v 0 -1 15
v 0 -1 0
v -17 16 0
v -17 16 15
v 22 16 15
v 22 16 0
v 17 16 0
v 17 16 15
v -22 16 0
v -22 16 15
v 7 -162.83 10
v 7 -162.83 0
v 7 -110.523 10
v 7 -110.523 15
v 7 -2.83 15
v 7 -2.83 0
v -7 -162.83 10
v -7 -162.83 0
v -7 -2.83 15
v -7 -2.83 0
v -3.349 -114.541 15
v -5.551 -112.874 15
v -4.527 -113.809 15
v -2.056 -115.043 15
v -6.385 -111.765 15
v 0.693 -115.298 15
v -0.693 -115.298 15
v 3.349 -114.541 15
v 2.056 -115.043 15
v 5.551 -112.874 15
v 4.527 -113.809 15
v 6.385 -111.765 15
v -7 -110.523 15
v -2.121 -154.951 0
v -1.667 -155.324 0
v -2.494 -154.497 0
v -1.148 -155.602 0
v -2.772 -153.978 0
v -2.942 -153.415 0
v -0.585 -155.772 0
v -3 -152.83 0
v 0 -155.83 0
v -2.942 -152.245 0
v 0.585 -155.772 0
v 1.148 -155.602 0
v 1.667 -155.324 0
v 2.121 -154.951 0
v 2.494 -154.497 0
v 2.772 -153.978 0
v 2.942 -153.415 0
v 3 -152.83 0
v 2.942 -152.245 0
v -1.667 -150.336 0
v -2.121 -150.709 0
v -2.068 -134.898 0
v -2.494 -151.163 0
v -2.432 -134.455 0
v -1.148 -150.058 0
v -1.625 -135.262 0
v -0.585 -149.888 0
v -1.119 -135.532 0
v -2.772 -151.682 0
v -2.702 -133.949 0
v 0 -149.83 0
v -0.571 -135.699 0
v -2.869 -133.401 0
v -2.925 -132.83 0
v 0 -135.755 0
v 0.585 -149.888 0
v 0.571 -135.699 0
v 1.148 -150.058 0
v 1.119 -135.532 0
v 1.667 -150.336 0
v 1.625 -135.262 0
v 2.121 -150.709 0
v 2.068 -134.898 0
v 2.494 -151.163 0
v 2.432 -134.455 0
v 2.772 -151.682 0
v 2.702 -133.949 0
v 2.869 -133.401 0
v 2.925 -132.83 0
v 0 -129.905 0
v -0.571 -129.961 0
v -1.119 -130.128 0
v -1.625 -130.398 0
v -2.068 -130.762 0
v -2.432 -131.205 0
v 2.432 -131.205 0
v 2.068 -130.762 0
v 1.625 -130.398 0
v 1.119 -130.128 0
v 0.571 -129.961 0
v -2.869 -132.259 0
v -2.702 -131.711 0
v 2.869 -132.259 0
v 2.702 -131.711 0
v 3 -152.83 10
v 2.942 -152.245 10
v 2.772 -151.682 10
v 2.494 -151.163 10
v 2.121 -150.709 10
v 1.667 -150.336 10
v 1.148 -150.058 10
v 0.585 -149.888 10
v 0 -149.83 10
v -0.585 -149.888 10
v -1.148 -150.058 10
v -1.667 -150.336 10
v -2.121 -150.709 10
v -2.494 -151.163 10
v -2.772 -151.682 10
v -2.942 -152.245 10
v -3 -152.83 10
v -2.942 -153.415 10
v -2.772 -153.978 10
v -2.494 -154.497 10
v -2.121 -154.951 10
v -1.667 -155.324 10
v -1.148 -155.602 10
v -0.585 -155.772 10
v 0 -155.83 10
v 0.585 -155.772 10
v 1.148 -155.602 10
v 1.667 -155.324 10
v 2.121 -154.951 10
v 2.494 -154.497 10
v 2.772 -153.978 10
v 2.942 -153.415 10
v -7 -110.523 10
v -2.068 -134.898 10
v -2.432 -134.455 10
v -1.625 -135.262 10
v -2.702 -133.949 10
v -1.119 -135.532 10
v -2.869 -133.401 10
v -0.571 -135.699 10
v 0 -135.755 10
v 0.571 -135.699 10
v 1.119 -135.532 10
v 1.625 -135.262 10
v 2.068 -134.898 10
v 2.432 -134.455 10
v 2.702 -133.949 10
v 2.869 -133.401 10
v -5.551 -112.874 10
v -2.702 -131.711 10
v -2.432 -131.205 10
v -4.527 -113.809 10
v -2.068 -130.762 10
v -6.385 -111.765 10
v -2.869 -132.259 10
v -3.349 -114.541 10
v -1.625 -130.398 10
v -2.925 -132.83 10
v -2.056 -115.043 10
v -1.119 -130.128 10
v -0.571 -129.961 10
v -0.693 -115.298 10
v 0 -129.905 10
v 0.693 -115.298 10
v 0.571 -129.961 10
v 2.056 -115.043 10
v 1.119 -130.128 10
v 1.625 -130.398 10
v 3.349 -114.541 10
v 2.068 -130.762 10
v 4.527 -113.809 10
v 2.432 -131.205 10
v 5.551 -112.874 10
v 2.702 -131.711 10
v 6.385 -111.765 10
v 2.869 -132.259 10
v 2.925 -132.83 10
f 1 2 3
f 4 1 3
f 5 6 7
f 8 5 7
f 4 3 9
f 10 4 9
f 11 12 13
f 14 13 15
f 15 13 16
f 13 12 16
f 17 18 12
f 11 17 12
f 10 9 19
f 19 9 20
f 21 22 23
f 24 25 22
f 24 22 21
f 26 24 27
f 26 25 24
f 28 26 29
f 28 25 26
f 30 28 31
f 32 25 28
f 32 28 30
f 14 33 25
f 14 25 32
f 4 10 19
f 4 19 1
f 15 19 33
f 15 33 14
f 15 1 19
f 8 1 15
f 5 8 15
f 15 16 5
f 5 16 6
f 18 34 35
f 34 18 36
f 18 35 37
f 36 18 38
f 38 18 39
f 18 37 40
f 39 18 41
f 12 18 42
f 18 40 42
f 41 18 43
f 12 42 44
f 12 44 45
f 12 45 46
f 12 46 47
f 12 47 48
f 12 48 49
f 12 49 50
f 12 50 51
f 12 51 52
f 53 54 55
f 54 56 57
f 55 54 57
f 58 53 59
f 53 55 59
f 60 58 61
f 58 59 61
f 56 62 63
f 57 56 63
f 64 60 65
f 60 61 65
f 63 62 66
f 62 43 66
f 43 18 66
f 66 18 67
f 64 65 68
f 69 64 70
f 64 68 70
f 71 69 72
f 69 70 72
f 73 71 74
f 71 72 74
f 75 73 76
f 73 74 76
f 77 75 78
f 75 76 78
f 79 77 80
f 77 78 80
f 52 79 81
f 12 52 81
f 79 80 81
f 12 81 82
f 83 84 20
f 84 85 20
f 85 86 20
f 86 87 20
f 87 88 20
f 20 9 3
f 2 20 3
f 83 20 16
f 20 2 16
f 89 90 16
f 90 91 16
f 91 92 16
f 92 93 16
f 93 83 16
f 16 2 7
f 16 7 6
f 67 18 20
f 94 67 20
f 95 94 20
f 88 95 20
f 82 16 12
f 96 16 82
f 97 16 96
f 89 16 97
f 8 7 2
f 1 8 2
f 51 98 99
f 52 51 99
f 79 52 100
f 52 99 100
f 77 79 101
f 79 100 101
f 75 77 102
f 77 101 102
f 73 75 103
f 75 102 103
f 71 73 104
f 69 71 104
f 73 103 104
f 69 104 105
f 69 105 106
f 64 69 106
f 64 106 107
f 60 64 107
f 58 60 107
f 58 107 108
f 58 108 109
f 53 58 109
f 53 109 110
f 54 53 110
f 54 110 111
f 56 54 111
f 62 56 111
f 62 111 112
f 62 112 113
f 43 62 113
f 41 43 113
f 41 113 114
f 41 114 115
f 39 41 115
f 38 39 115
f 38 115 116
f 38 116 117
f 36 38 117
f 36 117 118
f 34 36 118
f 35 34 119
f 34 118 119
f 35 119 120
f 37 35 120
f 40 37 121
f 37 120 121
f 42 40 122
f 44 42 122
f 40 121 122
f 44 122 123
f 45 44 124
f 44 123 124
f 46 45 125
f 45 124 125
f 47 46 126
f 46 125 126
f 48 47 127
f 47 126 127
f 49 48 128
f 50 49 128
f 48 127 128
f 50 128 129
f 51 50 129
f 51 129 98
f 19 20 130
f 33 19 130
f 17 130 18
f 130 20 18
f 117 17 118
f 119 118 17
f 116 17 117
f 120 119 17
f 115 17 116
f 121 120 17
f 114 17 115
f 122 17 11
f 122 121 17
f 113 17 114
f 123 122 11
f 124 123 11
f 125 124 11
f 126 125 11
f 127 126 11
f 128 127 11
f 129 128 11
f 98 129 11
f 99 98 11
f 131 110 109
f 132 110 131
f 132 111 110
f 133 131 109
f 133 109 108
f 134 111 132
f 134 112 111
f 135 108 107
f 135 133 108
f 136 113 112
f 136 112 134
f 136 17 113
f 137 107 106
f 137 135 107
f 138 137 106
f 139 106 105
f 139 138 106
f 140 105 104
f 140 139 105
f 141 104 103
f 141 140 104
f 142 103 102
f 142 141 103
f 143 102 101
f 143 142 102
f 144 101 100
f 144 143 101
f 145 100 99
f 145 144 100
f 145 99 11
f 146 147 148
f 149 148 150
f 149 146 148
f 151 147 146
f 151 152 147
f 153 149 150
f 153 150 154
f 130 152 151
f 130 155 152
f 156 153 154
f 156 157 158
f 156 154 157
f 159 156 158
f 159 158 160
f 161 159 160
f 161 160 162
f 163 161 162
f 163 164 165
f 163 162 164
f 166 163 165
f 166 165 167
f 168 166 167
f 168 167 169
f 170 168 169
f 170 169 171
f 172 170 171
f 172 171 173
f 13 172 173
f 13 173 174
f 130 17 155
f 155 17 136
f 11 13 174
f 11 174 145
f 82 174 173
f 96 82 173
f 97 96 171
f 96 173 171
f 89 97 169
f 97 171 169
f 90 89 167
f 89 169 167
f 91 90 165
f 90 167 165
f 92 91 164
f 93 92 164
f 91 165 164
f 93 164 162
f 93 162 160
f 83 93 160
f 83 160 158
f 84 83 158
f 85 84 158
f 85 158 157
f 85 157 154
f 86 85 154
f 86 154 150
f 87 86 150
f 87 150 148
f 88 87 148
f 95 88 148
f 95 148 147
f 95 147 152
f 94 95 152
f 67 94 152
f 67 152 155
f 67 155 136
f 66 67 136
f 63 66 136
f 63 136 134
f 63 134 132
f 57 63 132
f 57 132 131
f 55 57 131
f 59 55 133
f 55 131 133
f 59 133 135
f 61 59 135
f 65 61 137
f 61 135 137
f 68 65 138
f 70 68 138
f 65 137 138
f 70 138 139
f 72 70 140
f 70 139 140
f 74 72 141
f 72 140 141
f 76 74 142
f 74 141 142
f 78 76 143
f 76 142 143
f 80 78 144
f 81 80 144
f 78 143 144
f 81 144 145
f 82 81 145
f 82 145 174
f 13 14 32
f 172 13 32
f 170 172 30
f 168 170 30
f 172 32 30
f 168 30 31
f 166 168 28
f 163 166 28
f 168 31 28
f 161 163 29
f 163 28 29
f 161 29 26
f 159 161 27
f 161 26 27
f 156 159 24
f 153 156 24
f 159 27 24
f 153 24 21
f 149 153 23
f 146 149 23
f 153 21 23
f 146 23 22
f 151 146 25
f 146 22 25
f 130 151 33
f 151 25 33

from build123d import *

# Parameters (mm, degrees)
BOSS_EXTRUDE1_DEPTH = 15
SKETCH2_R           = 2.925
SKETCH2_R_2         = 3
CUT_EXTRUDE1_DEPTH  = 16
CUT_EXTRUDE2_DEPTH  = 5


with BuildPart() as part:
    # Sketch1 → Boss-Extrude1 (new body)
    with BuildSketch(Plane.XY):
        Polygon((7, -2.83), (22, 16), (17, 16), (0, -1), (-17, 16), (-22, 16), (-7, -2.83), (-7, -162.83), (7, -162.83), align=None)
    extrude(amount=BOSS_EXTRUDE1_DEPTH)

    # Sketch2 → Cut-Extrude1 (cut, through all)
    with BuildSketch(Plane.XY.offset(15)):
        with Locations((0, -132.83)):
            Circle(SKETCH2_R)
        with Locations((0, -152.83)):
            Circle(SKETCH2_R_2)
    extrude(amount=-CUT_EXTRUDE1_DEPTH, mode=Mode.SUBTRACT)

    # Sketch3 → Cut-Extrude2 (cut)
    with BuildSketch(Plane.XY.offset(15)):
        with BuildLine():
            Line((-7, -110.522582404), (-7, -162.83))
            Line((-7, -162.83), (7, -162.83))
            Line((7, -162.83), (7, -110.522582404))
            ThreePointArc((7, -110.522582404), (0, -115.33), (-7, -110.522582404))
        make_face()
    extrude(amount=-CUT_EXTRUDE2_DEPTH, mode=Mode.SUBTRACT)


solid = part.part
